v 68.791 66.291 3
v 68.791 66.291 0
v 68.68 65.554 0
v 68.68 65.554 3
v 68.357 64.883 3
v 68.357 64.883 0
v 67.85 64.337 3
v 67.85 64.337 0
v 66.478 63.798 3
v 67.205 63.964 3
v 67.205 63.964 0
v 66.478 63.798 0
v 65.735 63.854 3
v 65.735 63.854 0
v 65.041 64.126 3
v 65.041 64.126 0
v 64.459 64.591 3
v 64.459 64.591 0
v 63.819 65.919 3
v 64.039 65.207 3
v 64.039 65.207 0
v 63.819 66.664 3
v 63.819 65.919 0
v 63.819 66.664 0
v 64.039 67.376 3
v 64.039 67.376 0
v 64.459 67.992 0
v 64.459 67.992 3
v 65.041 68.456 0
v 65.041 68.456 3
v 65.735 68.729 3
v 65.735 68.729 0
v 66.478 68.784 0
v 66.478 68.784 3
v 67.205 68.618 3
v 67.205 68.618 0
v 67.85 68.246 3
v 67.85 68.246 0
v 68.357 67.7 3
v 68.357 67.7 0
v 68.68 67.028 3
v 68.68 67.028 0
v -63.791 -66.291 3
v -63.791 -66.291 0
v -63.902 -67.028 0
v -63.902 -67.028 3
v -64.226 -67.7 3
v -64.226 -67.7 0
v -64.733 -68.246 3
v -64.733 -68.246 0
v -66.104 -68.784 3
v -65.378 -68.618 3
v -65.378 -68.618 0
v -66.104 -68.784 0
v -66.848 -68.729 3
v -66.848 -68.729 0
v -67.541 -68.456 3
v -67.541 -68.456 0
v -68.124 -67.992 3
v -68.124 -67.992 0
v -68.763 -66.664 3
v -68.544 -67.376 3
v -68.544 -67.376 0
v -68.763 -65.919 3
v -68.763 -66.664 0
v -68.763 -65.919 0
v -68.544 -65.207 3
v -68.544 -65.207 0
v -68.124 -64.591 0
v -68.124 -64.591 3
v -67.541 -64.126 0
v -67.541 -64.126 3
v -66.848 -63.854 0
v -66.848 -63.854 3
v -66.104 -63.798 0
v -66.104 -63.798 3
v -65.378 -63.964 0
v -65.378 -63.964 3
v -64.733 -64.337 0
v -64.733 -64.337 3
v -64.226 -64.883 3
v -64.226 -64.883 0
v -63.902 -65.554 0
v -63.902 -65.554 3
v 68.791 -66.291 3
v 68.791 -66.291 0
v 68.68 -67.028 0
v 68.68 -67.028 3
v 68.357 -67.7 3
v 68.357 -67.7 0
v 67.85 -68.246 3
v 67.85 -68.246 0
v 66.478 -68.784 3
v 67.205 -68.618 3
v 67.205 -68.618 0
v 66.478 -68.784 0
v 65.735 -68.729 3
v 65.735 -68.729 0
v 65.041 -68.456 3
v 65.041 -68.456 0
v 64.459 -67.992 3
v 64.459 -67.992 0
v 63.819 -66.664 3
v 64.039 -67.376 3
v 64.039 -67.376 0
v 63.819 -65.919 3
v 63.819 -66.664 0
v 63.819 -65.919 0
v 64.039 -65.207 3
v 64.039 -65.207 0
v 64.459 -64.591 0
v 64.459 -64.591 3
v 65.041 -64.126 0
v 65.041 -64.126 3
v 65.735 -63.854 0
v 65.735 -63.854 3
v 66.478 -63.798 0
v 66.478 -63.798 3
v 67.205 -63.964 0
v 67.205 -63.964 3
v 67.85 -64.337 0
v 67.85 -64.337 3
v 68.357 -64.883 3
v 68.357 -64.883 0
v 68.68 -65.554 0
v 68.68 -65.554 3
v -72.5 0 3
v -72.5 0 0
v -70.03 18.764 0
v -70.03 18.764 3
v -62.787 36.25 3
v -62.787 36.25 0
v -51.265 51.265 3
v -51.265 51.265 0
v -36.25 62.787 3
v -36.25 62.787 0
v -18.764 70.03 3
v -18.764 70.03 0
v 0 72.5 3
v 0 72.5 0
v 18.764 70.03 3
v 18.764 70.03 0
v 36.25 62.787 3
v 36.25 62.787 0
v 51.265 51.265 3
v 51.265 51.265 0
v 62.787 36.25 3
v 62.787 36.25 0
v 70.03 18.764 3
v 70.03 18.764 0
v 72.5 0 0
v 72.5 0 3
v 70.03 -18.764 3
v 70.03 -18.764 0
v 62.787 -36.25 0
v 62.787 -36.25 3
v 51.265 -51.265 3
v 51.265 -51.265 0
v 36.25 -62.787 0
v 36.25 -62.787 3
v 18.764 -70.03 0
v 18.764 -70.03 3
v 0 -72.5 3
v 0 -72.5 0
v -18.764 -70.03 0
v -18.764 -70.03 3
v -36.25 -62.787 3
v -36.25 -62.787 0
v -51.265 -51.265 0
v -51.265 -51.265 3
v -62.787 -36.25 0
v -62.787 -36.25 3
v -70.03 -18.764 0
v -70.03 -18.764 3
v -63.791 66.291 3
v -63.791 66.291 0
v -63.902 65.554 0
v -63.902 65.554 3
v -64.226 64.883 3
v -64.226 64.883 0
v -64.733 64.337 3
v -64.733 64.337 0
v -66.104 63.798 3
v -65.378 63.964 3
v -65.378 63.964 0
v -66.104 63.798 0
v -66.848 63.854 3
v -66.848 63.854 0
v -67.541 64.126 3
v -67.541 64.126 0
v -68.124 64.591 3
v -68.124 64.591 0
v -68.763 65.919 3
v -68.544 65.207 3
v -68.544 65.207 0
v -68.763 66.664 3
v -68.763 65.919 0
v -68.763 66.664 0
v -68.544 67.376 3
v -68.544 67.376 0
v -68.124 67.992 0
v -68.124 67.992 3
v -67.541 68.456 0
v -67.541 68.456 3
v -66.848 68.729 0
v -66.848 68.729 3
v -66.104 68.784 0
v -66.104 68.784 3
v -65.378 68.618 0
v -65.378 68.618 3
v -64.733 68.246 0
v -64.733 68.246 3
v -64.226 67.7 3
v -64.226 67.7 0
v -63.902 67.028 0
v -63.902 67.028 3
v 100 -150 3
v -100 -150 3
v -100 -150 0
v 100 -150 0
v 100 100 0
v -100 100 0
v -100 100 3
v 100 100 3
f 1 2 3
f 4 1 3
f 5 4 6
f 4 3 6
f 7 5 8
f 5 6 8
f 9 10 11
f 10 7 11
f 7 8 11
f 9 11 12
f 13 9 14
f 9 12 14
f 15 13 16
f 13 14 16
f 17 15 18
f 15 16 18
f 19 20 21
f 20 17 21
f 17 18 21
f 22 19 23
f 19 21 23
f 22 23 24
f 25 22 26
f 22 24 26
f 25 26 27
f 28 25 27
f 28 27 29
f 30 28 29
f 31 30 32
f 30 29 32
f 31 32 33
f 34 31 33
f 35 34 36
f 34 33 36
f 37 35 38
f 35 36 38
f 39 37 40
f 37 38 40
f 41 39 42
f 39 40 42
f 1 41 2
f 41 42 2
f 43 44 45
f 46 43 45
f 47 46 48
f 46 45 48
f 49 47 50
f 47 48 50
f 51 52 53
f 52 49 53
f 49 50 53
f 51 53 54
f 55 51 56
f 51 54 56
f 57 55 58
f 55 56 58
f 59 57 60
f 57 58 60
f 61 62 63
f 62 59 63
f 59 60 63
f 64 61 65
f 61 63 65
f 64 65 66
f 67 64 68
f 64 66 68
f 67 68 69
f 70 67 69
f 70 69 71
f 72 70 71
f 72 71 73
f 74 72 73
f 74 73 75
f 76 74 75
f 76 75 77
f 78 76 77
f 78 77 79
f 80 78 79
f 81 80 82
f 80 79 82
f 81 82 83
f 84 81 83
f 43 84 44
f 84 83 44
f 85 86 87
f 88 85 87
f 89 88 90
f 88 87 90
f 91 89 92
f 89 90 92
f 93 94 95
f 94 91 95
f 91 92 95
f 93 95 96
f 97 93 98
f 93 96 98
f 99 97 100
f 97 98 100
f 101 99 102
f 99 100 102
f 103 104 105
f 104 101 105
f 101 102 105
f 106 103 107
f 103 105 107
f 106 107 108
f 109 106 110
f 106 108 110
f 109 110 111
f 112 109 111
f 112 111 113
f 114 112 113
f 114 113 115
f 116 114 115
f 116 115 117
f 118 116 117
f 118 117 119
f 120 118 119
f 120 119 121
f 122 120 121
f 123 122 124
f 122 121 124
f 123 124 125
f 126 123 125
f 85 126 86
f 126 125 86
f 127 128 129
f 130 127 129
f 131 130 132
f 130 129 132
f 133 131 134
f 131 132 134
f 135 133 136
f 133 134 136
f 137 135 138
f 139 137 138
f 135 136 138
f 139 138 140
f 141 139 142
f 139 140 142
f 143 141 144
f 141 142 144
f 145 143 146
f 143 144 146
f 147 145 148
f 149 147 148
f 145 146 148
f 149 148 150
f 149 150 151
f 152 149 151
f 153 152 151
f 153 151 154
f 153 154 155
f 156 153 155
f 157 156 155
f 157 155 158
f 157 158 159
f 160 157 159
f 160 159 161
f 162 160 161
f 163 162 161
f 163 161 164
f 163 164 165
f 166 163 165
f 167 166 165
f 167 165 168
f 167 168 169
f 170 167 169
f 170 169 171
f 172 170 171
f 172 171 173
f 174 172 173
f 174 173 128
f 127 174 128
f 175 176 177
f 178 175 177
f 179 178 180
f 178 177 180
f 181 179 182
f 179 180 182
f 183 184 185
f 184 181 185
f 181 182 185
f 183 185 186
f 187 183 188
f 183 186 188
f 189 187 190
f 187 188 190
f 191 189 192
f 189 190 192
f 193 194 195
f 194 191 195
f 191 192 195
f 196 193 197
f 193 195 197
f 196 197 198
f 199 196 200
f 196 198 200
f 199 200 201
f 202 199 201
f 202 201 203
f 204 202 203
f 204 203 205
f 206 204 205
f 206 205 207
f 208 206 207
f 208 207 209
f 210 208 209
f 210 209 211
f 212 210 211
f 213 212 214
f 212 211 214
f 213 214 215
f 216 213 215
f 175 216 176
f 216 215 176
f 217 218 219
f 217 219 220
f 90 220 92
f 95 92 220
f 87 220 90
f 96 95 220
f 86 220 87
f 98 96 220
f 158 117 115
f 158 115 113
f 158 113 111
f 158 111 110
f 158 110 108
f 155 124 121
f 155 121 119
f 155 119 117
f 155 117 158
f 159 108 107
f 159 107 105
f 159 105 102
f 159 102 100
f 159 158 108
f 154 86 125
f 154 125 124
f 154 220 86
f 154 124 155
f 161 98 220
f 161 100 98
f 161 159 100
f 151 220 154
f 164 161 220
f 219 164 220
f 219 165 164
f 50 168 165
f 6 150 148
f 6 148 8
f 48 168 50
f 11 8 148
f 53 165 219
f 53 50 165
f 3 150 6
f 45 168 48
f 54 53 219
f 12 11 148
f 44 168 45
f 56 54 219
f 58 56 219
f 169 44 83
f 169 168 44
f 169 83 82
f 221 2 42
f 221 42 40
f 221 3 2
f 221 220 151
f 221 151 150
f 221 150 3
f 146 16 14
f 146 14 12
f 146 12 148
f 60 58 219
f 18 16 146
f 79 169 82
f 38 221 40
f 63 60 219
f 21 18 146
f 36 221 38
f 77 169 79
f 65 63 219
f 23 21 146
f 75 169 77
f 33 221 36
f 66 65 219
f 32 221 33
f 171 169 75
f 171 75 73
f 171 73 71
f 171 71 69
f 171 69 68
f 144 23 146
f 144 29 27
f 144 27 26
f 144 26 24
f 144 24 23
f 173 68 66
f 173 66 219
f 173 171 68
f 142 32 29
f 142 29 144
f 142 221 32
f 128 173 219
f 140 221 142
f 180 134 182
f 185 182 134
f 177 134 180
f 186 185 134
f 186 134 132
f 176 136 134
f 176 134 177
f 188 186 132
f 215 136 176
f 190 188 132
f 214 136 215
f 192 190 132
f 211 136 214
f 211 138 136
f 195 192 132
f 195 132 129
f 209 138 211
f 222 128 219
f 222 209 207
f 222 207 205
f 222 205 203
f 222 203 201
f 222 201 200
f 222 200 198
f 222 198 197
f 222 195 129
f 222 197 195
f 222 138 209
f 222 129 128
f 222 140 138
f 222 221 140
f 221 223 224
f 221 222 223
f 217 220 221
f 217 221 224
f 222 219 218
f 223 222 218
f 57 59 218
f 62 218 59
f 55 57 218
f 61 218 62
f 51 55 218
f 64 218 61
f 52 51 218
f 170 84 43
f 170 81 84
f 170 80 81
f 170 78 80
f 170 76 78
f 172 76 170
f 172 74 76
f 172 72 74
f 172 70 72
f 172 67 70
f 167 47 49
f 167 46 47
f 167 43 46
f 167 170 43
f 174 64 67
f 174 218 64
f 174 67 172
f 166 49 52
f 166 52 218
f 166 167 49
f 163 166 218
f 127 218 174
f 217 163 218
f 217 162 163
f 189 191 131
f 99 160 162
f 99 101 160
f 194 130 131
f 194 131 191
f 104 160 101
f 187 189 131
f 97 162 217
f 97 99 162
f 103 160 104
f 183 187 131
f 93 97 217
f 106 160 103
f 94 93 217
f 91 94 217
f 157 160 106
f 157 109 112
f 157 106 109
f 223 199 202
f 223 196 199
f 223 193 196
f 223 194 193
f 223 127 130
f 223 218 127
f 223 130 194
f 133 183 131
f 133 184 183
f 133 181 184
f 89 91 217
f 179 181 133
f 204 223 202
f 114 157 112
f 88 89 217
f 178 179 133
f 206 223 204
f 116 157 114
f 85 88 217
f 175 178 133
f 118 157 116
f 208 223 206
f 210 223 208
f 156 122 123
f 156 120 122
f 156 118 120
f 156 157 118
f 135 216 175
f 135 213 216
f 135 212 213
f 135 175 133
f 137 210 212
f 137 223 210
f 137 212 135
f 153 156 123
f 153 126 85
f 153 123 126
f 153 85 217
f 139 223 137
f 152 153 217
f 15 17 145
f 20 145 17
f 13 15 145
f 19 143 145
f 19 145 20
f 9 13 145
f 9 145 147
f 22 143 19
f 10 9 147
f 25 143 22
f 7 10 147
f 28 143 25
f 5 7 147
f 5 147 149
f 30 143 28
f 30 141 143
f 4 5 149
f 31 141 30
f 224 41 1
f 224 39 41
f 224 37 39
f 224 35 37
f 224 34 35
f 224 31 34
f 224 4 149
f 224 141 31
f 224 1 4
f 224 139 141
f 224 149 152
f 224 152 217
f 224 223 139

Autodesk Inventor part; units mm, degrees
ref_plane "YZ Plane" through (0, 0, 0) normal (1, 0, 0) x (0, 1, 0)
ref_plane "XZ Plane" through (0, 0, 0) normal (0, 1, 0) x (-1, 0, 0)
ref_plane "XY Plane" through (0, 0, 0) normal (0, 0, 1) x (1, 0, 0)
sketch "スケッチ1" plane through (0, 0, 0) normal (0, 0, 1) x (1, 0, 0)
  line L0 (-100, 100) -> (100, 100)
  line L1 (100, 100) -> (100, -100)
  line L2 (100, -100) -> (-100, -100)
  line L3 (-100, -100) -> (-100, 100)
  line L4 (-100, 100) -> (100, -100) construction
  line L5 (100, 100) -> (-100, -100) construction
  circle A0 centre (0, 0) radius 93.75 construction
  circle A1 centre (-66.2913, 66.2913) radius 2.5
  circle A2 centre (66.2913, 66.2913) radius 2.5
  circle A3 centre (66.2913, -66.2913) radius 2.5
  circle A4 centre (-66.2913, -66.2913) radius 2.5
  dimension "d0" = 200
  dimension "d1" = 200
  dimension "d2" = 187.5
  dimension "d3" = 5
  dimension "d4" = 5
  dimension "d5" = 5
  dimension "d6" = 5
extrude "押し出し1" add sketch "スケッチ1" along normal blind 3
sketch "スケッチ2" plane through (0, 0, 0) normal (0, 0, -1) x (-1, 0, 0)
  circle A0 centre (0, 0) radius 72.5
  dimension "d9" = 145
extrude "押し出し2" cut sketch "スケッチ2" against normal blind 10
sketch "スケッチ3" plane through (0, 0, 3) normal (0, 0, 1) x (1, 0, 0)
  circle A0 centre (-66.2913, -66.2913) radius 2.5 projected
  circle A1 centre (66.2913, -66.2913) radius 2.5 projected
  point P0 (0, 0)
sketch "スケッチ4" plane through (-100, -100, 0) normal (0, -1, 0) x (1, 0, 0)
  line L0 (0, 0) -> (0, 3) projected
  line L1 (200, 0) -> (200, 3) projected
  line L2 (0, 3) -> (200, 3)
  line L3 (200, 3) -> (200, 0)
  line L4 (200, 0) -> (0, 0)
  line L5 (0, 0) -> (0, 3)
  point P0 (100, 0)
extrude "押し出し3" add sketch "スケッチ4" along normal blind 50
properties part number "ベアリング板" material "アルミニウム 6061"
